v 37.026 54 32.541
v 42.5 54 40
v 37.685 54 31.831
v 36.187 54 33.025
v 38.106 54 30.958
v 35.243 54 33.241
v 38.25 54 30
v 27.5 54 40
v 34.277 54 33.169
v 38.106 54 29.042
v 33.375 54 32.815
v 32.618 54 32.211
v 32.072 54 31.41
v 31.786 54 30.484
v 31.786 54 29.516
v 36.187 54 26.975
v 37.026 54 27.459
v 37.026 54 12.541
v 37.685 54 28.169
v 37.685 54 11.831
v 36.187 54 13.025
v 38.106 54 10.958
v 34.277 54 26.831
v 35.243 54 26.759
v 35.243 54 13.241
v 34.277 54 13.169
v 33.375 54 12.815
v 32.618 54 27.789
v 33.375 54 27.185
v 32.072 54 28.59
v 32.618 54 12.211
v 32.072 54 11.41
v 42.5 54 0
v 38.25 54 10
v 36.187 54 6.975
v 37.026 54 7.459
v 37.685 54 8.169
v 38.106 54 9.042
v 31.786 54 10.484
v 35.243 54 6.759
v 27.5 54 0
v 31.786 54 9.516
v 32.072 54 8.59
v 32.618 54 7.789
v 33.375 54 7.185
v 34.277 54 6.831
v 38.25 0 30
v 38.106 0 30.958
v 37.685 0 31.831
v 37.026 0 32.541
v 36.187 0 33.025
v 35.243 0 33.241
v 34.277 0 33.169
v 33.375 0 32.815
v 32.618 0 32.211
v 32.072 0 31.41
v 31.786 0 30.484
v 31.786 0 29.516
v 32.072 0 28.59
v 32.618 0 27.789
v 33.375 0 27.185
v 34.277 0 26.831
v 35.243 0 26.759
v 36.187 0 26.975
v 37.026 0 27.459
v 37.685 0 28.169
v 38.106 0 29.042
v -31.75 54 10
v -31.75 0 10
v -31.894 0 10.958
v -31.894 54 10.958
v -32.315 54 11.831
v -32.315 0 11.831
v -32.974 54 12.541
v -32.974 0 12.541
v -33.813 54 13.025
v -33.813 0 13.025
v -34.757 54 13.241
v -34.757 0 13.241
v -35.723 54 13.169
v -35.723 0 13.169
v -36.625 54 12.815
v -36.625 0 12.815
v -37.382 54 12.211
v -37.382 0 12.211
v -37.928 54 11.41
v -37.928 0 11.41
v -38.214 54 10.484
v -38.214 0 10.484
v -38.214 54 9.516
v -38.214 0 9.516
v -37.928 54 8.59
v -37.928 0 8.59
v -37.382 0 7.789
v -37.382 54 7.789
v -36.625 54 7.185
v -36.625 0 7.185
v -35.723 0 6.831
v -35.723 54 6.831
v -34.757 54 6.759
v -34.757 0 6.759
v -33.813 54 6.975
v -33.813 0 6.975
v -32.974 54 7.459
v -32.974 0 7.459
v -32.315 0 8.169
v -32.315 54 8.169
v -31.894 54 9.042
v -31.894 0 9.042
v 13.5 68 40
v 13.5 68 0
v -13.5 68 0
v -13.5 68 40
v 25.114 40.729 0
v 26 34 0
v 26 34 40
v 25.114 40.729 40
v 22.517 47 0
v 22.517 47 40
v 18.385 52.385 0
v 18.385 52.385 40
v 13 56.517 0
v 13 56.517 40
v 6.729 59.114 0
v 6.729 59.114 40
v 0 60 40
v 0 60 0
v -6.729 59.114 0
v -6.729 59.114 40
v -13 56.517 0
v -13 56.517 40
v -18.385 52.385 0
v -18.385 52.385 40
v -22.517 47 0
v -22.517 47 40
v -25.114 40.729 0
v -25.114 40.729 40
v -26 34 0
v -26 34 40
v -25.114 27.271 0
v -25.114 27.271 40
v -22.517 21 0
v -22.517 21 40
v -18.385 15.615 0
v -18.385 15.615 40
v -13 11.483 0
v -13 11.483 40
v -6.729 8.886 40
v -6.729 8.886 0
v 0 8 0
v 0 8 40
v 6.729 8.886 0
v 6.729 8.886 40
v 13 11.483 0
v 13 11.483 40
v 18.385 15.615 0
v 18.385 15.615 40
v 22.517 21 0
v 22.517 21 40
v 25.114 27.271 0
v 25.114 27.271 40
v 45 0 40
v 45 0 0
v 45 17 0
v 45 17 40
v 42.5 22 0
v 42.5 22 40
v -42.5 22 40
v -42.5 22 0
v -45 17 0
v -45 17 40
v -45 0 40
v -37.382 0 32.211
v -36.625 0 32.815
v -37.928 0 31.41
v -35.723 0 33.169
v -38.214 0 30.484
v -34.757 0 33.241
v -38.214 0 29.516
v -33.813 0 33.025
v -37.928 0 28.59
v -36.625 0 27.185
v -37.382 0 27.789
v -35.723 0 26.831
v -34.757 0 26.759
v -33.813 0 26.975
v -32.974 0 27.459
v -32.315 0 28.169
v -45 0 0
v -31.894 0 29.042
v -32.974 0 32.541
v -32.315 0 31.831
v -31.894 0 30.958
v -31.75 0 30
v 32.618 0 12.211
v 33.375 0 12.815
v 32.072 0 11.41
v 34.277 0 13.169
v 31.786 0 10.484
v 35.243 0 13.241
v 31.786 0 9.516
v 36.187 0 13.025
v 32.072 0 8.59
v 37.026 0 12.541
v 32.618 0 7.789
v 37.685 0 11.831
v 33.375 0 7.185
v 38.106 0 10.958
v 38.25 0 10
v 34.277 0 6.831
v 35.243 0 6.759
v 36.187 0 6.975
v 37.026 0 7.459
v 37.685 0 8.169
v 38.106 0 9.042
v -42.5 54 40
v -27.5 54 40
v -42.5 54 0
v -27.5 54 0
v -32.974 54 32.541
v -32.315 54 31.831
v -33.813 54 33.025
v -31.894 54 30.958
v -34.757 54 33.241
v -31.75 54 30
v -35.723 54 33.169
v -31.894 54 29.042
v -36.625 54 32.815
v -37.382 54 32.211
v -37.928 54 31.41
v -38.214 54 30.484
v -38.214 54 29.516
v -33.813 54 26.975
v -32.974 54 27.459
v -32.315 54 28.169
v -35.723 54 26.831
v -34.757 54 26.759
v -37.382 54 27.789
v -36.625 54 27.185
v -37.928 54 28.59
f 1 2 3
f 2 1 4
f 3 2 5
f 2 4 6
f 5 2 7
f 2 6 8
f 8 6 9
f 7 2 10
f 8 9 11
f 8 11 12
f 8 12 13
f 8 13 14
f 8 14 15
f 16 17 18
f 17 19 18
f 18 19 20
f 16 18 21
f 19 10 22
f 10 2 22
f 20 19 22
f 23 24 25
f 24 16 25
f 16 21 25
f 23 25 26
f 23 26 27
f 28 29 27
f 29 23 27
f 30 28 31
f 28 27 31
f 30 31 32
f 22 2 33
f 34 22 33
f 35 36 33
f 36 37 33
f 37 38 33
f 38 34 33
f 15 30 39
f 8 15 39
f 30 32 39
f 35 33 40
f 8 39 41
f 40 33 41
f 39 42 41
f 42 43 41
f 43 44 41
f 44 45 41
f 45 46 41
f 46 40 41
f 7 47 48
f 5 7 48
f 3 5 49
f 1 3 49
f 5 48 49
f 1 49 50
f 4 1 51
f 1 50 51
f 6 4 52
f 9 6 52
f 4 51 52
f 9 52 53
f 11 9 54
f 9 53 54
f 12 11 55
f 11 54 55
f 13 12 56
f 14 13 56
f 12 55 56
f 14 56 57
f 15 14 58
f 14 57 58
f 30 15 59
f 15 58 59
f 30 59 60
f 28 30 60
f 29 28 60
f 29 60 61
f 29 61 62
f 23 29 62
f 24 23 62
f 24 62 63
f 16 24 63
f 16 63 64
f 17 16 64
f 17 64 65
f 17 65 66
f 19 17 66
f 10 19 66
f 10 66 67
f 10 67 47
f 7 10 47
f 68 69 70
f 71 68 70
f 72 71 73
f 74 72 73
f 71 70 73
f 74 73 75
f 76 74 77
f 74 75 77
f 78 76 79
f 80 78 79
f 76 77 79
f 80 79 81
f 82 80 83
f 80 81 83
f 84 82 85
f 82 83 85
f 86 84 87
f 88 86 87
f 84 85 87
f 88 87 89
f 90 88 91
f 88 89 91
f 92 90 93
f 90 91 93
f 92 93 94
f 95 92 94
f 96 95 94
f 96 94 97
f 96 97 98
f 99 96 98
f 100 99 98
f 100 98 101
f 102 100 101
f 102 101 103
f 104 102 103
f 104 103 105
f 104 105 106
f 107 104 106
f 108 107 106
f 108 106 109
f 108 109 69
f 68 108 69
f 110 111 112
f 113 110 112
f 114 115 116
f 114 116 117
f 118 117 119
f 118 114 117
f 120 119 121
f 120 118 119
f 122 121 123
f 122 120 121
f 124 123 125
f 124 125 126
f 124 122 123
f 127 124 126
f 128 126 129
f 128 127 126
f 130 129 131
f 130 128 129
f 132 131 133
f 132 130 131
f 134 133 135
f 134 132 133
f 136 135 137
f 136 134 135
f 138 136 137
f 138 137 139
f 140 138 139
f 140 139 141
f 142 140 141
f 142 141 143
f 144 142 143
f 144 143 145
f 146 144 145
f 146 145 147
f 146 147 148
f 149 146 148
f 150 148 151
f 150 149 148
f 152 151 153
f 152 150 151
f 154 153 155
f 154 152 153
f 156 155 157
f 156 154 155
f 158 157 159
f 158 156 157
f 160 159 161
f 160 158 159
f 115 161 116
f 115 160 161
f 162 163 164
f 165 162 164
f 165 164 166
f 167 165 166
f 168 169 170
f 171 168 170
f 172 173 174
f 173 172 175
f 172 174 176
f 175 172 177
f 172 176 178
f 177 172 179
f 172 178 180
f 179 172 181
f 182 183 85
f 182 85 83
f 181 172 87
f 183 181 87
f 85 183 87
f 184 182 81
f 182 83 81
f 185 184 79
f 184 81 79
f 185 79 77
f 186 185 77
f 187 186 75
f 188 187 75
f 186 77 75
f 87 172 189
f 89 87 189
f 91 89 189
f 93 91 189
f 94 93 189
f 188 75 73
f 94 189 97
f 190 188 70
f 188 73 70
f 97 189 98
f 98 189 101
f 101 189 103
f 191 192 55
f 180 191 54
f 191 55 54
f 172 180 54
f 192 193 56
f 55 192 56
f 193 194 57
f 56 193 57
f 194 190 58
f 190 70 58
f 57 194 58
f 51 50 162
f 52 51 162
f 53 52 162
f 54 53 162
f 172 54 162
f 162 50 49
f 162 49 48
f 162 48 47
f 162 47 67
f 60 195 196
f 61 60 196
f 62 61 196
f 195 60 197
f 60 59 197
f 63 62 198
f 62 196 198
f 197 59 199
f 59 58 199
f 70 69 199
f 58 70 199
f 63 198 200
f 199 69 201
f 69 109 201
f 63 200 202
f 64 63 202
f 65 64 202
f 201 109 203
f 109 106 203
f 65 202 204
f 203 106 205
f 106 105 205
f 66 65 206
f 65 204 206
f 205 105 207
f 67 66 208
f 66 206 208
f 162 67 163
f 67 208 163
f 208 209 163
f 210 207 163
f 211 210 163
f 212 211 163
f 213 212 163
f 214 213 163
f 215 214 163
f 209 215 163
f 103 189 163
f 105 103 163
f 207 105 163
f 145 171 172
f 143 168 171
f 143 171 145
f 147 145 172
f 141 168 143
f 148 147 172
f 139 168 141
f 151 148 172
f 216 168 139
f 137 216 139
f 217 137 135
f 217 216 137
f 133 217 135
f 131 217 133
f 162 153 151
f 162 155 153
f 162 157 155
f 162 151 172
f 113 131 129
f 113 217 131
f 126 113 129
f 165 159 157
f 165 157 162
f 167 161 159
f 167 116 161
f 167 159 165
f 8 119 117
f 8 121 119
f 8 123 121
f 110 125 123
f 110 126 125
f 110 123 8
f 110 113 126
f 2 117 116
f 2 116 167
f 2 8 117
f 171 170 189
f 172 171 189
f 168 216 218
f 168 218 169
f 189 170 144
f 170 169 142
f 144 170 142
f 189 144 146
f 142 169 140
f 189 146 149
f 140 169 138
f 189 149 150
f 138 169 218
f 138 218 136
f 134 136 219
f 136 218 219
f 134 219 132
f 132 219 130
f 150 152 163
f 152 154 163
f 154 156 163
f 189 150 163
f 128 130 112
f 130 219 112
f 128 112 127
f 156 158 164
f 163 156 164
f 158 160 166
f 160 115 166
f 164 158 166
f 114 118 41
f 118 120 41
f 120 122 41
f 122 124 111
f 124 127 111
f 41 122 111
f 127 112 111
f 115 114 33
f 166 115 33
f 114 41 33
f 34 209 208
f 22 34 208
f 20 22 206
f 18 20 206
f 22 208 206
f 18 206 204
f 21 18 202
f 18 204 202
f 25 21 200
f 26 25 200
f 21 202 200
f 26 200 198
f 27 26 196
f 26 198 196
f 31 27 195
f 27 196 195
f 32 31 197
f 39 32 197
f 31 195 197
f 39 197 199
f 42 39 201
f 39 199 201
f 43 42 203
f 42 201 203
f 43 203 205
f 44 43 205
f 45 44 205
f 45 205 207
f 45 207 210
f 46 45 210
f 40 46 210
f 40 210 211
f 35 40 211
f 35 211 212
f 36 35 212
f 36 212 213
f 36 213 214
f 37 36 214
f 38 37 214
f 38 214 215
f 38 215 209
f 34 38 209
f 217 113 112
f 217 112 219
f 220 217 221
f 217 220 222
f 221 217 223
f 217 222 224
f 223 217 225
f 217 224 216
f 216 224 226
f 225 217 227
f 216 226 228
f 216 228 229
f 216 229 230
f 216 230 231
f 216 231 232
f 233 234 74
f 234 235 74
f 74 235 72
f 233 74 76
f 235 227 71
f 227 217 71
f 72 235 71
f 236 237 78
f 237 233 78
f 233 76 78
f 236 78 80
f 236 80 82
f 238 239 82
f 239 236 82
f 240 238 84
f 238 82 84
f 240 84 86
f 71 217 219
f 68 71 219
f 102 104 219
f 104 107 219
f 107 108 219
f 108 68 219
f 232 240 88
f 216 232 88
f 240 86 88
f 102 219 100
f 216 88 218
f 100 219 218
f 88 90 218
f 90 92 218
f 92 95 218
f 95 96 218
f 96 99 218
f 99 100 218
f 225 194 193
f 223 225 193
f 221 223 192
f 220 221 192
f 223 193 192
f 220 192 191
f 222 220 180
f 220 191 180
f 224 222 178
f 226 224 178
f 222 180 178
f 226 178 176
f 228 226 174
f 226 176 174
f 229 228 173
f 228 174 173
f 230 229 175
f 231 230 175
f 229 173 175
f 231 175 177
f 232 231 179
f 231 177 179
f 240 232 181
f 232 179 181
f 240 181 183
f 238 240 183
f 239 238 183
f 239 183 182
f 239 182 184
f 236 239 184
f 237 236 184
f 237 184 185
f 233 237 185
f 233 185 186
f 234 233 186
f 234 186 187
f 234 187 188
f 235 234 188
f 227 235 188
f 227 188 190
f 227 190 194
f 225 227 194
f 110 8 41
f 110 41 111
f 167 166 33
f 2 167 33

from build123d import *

# Parameters (mm, degrees)
SKETCH_R     = 26
PAD_DEPTH    = 40
SKETCH001_R  = 3.25
POCKET_DEPTH = 68.001


with BuildPart() as part:
    # Sketch → Pad (new body)
    with BuildSketch(Plane.XY):
        Polygon((-45, 0), (45, 0), (45, 17), (42.5, 22), (42.5, 54), (27.5, 54), (13.5, 68), (-13.5, 68), (-27.5, 54), (-42.5, 54), (-42.5, 22), (-45, 17), align=None)
        with Locations((0, 34)):
            Circle(SKETCH_R, mode=Mode.SUBTRACT)
    extrude(amount=PAD_DEPTH)

    # Sketch001 (on Face1 of Pad) → Pocket (cut, through all)
    with BuildSketch(Plane.XZ):
        with Locations((-35, 30)):
            Circle(SKETCH001_R)
        with Locations((-35, 10)):
            Circle(SKETCH001_R)
        with Locations((35, 10)):
            Circle(SKETCH001_R)
        with Locations((35, 30)):
            Circle(SKETCH001_R)
    extrude(amount=-POCKET_DEPTH, mode=Mode.SUBTRACT)


solid = part.part
